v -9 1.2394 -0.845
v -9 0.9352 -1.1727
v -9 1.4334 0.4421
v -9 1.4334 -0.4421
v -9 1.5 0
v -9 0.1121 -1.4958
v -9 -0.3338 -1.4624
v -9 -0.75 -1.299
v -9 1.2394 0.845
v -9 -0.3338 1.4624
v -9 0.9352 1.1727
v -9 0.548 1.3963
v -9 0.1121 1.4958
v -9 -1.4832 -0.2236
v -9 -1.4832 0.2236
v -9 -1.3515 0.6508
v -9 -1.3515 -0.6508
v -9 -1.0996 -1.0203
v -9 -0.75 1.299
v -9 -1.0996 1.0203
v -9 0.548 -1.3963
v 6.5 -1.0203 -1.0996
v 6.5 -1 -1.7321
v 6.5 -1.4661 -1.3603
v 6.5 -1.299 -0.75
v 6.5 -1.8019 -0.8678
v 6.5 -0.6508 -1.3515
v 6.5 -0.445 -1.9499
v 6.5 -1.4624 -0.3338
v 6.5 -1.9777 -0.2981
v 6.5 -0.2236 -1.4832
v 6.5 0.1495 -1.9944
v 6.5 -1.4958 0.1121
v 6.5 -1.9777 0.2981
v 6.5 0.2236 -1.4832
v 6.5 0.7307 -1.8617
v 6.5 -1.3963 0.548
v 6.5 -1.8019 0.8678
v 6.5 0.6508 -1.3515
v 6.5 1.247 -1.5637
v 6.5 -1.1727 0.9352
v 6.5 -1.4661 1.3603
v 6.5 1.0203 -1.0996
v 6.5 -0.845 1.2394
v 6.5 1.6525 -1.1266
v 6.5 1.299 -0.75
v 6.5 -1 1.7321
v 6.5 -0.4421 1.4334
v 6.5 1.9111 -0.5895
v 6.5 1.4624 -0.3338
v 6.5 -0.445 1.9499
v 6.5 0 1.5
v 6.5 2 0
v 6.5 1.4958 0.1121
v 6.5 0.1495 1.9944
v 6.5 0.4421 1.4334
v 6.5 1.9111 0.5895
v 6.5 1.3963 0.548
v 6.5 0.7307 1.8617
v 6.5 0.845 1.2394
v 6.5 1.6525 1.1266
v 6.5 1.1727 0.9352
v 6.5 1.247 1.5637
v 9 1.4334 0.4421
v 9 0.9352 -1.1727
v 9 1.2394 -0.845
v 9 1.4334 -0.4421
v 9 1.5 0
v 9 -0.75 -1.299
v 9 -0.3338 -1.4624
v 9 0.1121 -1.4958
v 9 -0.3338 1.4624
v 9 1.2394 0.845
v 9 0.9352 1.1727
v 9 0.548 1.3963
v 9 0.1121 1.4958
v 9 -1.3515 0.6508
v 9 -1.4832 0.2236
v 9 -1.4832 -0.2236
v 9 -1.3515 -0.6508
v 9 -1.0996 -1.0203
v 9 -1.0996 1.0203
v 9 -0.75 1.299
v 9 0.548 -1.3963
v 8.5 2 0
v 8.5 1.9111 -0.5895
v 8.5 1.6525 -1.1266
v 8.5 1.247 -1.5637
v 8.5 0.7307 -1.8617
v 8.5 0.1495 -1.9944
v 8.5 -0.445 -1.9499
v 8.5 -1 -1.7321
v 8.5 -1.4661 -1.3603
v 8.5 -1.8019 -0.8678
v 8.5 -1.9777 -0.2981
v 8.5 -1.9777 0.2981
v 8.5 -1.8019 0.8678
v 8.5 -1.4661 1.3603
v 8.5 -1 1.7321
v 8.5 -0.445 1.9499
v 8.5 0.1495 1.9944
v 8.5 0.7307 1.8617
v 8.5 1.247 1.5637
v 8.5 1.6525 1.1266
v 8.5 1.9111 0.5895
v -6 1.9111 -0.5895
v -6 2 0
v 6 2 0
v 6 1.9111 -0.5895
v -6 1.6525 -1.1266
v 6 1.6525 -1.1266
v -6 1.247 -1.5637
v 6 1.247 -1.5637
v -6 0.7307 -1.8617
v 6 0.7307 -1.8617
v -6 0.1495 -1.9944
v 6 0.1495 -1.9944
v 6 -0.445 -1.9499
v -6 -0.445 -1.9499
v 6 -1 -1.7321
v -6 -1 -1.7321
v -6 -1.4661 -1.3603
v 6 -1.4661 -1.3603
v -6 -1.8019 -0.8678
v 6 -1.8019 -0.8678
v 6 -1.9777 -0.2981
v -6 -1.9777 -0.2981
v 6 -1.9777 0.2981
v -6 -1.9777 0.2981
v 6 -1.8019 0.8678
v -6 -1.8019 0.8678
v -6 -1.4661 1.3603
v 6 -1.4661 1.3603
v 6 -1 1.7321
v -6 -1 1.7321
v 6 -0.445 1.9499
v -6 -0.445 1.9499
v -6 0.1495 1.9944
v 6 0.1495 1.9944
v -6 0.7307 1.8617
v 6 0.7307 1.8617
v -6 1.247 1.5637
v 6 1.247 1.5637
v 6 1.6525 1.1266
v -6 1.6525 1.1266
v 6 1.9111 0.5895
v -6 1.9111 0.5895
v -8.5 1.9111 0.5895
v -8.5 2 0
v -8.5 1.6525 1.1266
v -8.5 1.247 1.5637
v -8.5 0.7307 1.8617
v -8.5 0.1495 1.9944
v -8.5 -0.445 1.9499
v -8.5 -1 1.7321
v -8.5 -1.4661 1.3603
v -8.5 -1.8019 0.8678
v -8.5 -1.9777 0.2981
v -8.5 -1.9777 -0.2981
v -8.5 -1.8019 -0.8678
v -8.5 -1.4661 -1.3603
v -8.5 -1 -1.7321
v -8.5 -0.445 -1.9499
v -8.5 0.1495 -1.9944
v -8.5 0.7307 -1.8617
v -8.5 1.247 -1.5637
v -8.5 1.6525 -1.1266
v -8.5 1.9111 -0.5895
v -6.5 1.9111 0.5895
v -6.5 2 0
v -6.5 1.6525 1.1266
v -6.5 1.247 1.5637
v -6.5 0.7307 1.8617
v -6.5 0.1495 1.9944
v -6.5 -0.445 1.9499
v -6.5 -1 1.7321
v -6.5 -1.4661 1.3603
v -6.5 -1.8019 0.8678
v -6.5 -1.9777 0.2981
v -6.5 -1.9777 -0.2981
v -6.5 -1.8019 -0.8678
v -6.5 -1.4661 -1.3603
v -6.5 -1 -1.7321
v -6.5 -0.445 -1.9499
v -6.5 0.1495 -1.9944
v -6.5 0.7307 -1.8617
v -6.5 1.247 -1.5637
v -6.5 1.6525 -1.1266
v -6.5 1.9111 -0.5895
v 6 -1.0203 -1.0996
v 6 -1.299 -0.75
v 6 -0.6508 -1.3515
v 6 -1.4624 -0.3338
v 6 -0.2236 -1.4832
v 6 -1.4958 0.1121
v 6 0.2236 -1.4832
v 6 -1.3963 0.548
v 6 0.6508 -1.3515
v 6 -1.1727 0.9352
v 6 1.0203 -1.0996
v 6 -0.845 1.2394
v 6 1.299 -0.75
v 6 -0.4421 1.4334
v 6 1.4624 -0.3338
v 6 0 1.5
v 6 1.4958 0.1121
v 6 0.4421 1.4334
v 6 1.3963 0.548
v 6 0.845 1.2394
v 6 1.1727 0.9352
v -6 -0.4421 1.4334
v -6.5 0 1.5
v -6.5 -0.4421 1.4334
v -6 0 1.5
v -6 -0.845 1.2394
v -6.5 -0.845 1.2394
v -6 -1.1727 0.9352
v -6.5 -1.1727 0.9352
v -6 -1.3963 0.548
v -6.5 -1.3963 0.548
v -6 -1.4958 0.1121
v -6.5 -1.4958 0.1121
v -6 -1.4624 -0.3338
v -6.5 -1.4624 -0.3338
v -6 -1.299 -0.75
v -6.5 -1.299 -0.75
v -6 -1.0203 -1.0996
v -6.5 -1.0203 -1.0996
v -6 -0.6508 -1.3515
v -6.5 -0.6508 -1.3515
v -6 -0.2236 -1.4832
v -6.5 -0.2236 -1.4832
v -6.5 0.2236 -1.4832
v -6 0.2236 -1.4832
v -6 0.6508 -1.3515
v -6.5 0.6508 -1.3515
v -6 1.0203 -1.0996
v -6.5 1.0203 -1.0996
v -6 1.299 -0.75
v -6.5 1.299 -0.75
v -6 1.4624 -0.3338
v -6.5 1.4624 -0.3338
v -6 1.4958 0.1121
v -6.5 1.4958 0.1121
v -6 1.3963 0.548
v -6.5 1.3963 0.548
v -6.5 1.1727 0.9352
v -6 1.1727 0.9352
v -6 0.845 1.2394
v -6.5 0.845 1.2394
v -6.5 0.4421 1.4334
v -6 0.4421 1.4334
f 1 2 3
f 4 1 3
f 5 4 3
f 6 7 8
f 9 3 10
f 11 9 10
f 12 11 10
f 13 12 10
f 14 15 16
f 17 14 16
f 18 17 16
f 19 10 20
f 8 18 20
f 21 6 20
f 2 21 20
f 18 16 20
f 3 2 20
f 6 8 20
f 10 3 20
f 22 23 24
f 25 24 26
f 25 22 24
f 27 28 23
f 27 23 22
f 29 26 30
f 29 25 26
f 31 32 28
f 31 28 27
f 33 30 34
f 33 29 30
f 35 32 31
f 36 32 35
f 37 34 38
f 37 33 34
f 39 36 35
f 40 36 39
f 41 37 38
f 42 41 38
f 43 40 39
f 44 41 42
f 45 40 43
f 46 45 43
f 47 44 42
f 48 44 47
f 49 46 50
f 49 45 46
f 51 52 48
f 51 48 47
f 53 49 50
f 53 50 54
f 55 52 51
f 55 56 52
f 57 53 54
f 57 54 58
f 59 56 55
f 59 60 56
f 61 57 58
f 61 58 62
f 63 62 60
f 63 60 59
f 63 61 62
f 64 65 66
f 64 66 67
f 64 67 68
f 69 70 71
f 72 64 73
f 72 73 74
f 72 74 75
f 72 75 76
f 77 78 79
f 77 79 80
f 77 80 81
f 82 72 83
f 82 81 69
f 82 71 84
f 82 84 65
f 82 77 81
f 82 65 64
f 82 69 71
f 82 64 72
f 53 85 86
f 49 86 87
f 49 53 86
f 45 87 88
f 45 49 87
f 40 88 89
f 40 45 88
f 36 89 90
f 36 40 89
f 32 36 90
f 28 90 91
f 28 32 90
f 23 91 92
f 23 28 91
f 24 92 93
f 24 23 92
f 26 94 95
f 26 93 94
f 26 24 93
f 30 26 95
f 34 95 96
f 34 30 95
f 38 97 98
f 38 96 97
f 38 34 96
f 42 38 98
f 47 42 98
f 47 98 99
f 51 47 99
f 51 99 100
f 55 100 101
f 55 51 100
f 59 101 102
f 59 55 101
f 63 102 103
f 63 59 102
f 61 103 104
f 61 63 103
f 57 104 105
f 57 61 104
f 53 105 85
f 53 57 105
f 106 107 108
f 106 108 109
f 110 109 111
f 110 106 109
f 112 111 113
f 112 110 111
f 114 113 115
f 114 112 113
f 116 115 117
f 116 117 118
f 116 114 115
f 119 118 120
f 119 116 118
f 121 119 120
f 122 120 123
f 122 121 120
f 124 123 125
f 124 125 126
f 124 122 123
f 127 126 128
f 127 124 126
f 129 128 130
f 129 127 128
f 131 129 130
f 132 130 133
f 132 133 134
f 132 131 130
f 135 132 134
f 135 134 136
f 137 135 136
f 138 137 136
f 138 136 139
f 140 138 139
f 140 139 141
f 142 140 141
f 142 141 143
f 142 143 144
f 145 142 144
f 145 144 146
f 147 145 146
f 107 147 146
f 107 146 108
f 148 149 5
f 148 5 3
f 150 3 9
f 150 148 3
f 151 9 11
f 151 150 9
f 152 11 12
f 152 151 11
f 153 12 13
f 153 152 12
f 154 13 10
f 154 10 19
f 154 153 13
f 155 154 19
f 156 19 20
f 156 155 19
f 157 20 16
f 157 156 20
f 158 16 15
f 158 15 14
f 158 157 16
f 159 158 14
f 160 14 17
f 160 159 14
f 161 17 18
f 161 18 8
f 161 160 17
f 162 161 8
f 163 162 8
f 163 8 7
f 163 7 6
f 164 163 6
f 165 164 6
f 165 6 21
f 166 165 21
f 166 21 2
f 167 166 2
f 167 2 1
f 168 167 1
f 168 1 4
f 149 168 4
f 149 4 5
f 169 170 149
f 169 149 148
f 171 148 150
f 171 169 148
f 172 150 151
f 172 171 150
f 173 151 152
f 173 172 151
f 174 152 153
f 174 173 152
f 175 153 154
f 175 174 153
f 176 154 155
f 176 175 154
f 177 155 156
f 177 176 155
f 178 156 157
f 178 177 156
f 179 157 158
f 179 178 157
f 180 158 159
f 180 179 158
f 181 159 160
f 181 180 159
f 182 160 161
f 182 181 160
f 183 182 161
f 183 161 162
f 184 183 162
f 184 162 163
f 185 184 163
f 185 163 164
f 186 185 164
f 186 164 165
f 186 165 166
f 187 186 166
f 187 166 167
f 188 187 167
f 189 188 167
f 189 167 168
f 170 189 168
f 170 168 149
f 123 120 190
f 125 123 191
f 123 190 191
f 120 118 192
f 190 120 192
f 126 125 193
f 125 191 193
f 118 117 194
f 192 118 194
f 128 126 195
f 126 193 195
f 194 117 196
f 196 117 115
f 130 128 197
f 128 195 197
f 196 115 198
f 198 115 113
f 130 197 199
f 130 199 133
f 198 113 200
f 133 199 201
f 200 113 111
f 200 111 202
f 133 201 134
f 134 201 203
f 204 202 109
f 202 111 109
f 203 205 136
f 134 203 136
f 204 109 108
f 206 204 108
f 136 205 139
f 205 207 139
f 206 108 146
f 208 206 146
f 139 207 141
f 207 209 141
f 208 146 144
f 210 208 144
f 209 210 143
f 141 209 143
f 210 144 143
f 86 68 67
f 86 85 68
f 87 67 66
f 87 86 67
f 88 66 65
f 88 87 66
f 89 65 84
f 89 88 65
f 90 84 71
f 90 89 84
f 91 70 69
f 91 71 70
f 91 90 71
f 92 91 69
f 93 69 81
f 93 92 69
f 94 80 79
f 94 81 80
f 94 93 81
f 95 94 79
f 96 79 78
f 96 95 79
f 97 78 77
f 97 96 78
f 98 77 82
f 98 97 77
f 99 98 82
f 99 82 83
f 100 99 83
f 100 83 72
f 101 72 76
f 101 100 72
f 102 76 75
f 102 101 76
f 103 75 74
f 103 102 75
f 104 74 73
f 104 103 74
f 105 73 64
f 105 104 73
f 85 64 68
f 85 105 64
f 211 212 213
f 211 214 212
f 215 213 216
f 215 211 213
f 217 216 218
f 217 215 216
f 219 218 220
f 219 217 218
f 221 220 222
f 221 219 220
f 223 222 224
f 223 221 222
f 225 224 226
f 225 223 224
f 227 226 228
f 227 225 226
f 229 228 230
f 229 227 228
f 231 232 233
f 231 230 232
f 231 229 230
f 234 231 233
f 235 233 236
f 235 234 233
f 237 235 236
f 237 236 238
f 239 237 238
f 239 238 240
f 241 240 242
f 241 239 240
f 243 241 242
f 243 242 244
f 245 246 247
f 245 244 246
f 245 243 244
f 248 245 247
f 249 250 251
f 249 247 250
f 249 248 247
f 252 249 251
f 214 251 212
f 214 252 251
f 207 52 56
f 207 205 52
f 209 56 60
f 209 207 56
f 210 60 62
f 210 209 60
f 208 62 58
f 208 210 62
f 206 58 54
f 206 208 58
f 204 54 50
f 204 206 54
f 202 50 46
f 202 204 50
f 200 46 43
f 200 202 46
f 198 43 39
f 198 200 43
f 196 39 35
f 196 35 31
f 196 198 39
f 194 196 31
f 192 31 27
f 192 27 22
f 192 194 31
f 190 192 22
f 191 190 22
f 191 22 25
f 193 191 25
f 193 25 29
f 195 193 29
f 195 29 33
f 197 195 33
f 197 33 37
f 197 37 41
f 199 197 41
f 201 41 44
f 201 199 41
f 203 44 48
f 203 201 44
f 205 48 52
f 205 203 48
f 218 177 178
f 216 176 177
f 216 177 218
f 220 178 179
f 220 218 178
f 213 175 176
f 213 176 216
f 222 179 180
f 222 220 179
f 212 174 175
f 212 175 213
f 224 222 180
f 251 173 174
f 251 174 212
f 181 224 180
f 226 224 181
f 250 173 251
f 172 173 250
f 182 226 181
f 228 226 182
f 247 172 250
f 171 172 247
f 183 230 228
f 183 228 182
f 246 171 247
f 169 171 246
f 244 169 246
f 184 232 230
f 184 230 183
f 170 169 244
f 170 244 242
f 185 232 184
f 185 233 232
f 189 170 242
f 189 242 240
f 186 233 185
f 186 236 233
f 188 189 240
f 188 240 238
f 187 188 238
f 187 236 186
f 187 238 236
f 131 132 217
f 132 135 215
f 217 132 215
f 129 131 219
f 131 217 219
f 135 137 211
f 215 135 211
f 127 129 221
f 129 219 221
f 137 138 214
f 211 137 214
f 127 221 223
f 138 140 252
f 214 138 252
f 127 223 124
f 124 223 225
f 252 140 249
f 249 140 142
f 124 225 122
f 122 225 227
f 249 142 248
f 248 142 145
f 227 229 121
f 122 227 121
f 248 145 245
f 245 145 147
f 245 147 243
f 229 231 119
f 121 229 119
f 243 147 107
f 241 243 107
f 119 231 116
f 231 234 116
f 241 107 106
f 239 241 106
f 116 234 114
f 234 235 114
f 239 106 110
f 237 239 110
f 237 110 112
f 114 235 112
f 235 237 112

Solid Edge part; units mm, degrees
sketch "Sketch1" plane through (0, 0, 0) normal (1, 0, 0) x (0, 1, 0)
  circle A0 centre (0, 0) radius 2
extrude "Protrusion1" add sketch "Sketch1" along normal mid plane 18
chamfer "Chamfer_1" distance 0.5 angle 45 2 edges at (9, -2, 0) (-9, -2, 0)
sketch "Sketch2" plane through (0, 0, 0) normal (0, -1, 0) x (1, 0, 0)
  line L0 (6, 2) -> (6.5, 2)
  line L1 (6.5, 2) -> (6.5, 1.5)
  line L2 (6.5, 1.5) -> (6, 1.5)
  line L3 (6, 1.5) -> (6, 2)
revolve "RevolvedCutout1" cut sketch "Sketch2" angle 360 about axis through (9, 0, 0) along (-1, 0, 0)
mirror "Mirror1" about plane through (0, 0, 0) normal (1, 0, 0) of "RevolvedCutout1"
properties material "PVC"
